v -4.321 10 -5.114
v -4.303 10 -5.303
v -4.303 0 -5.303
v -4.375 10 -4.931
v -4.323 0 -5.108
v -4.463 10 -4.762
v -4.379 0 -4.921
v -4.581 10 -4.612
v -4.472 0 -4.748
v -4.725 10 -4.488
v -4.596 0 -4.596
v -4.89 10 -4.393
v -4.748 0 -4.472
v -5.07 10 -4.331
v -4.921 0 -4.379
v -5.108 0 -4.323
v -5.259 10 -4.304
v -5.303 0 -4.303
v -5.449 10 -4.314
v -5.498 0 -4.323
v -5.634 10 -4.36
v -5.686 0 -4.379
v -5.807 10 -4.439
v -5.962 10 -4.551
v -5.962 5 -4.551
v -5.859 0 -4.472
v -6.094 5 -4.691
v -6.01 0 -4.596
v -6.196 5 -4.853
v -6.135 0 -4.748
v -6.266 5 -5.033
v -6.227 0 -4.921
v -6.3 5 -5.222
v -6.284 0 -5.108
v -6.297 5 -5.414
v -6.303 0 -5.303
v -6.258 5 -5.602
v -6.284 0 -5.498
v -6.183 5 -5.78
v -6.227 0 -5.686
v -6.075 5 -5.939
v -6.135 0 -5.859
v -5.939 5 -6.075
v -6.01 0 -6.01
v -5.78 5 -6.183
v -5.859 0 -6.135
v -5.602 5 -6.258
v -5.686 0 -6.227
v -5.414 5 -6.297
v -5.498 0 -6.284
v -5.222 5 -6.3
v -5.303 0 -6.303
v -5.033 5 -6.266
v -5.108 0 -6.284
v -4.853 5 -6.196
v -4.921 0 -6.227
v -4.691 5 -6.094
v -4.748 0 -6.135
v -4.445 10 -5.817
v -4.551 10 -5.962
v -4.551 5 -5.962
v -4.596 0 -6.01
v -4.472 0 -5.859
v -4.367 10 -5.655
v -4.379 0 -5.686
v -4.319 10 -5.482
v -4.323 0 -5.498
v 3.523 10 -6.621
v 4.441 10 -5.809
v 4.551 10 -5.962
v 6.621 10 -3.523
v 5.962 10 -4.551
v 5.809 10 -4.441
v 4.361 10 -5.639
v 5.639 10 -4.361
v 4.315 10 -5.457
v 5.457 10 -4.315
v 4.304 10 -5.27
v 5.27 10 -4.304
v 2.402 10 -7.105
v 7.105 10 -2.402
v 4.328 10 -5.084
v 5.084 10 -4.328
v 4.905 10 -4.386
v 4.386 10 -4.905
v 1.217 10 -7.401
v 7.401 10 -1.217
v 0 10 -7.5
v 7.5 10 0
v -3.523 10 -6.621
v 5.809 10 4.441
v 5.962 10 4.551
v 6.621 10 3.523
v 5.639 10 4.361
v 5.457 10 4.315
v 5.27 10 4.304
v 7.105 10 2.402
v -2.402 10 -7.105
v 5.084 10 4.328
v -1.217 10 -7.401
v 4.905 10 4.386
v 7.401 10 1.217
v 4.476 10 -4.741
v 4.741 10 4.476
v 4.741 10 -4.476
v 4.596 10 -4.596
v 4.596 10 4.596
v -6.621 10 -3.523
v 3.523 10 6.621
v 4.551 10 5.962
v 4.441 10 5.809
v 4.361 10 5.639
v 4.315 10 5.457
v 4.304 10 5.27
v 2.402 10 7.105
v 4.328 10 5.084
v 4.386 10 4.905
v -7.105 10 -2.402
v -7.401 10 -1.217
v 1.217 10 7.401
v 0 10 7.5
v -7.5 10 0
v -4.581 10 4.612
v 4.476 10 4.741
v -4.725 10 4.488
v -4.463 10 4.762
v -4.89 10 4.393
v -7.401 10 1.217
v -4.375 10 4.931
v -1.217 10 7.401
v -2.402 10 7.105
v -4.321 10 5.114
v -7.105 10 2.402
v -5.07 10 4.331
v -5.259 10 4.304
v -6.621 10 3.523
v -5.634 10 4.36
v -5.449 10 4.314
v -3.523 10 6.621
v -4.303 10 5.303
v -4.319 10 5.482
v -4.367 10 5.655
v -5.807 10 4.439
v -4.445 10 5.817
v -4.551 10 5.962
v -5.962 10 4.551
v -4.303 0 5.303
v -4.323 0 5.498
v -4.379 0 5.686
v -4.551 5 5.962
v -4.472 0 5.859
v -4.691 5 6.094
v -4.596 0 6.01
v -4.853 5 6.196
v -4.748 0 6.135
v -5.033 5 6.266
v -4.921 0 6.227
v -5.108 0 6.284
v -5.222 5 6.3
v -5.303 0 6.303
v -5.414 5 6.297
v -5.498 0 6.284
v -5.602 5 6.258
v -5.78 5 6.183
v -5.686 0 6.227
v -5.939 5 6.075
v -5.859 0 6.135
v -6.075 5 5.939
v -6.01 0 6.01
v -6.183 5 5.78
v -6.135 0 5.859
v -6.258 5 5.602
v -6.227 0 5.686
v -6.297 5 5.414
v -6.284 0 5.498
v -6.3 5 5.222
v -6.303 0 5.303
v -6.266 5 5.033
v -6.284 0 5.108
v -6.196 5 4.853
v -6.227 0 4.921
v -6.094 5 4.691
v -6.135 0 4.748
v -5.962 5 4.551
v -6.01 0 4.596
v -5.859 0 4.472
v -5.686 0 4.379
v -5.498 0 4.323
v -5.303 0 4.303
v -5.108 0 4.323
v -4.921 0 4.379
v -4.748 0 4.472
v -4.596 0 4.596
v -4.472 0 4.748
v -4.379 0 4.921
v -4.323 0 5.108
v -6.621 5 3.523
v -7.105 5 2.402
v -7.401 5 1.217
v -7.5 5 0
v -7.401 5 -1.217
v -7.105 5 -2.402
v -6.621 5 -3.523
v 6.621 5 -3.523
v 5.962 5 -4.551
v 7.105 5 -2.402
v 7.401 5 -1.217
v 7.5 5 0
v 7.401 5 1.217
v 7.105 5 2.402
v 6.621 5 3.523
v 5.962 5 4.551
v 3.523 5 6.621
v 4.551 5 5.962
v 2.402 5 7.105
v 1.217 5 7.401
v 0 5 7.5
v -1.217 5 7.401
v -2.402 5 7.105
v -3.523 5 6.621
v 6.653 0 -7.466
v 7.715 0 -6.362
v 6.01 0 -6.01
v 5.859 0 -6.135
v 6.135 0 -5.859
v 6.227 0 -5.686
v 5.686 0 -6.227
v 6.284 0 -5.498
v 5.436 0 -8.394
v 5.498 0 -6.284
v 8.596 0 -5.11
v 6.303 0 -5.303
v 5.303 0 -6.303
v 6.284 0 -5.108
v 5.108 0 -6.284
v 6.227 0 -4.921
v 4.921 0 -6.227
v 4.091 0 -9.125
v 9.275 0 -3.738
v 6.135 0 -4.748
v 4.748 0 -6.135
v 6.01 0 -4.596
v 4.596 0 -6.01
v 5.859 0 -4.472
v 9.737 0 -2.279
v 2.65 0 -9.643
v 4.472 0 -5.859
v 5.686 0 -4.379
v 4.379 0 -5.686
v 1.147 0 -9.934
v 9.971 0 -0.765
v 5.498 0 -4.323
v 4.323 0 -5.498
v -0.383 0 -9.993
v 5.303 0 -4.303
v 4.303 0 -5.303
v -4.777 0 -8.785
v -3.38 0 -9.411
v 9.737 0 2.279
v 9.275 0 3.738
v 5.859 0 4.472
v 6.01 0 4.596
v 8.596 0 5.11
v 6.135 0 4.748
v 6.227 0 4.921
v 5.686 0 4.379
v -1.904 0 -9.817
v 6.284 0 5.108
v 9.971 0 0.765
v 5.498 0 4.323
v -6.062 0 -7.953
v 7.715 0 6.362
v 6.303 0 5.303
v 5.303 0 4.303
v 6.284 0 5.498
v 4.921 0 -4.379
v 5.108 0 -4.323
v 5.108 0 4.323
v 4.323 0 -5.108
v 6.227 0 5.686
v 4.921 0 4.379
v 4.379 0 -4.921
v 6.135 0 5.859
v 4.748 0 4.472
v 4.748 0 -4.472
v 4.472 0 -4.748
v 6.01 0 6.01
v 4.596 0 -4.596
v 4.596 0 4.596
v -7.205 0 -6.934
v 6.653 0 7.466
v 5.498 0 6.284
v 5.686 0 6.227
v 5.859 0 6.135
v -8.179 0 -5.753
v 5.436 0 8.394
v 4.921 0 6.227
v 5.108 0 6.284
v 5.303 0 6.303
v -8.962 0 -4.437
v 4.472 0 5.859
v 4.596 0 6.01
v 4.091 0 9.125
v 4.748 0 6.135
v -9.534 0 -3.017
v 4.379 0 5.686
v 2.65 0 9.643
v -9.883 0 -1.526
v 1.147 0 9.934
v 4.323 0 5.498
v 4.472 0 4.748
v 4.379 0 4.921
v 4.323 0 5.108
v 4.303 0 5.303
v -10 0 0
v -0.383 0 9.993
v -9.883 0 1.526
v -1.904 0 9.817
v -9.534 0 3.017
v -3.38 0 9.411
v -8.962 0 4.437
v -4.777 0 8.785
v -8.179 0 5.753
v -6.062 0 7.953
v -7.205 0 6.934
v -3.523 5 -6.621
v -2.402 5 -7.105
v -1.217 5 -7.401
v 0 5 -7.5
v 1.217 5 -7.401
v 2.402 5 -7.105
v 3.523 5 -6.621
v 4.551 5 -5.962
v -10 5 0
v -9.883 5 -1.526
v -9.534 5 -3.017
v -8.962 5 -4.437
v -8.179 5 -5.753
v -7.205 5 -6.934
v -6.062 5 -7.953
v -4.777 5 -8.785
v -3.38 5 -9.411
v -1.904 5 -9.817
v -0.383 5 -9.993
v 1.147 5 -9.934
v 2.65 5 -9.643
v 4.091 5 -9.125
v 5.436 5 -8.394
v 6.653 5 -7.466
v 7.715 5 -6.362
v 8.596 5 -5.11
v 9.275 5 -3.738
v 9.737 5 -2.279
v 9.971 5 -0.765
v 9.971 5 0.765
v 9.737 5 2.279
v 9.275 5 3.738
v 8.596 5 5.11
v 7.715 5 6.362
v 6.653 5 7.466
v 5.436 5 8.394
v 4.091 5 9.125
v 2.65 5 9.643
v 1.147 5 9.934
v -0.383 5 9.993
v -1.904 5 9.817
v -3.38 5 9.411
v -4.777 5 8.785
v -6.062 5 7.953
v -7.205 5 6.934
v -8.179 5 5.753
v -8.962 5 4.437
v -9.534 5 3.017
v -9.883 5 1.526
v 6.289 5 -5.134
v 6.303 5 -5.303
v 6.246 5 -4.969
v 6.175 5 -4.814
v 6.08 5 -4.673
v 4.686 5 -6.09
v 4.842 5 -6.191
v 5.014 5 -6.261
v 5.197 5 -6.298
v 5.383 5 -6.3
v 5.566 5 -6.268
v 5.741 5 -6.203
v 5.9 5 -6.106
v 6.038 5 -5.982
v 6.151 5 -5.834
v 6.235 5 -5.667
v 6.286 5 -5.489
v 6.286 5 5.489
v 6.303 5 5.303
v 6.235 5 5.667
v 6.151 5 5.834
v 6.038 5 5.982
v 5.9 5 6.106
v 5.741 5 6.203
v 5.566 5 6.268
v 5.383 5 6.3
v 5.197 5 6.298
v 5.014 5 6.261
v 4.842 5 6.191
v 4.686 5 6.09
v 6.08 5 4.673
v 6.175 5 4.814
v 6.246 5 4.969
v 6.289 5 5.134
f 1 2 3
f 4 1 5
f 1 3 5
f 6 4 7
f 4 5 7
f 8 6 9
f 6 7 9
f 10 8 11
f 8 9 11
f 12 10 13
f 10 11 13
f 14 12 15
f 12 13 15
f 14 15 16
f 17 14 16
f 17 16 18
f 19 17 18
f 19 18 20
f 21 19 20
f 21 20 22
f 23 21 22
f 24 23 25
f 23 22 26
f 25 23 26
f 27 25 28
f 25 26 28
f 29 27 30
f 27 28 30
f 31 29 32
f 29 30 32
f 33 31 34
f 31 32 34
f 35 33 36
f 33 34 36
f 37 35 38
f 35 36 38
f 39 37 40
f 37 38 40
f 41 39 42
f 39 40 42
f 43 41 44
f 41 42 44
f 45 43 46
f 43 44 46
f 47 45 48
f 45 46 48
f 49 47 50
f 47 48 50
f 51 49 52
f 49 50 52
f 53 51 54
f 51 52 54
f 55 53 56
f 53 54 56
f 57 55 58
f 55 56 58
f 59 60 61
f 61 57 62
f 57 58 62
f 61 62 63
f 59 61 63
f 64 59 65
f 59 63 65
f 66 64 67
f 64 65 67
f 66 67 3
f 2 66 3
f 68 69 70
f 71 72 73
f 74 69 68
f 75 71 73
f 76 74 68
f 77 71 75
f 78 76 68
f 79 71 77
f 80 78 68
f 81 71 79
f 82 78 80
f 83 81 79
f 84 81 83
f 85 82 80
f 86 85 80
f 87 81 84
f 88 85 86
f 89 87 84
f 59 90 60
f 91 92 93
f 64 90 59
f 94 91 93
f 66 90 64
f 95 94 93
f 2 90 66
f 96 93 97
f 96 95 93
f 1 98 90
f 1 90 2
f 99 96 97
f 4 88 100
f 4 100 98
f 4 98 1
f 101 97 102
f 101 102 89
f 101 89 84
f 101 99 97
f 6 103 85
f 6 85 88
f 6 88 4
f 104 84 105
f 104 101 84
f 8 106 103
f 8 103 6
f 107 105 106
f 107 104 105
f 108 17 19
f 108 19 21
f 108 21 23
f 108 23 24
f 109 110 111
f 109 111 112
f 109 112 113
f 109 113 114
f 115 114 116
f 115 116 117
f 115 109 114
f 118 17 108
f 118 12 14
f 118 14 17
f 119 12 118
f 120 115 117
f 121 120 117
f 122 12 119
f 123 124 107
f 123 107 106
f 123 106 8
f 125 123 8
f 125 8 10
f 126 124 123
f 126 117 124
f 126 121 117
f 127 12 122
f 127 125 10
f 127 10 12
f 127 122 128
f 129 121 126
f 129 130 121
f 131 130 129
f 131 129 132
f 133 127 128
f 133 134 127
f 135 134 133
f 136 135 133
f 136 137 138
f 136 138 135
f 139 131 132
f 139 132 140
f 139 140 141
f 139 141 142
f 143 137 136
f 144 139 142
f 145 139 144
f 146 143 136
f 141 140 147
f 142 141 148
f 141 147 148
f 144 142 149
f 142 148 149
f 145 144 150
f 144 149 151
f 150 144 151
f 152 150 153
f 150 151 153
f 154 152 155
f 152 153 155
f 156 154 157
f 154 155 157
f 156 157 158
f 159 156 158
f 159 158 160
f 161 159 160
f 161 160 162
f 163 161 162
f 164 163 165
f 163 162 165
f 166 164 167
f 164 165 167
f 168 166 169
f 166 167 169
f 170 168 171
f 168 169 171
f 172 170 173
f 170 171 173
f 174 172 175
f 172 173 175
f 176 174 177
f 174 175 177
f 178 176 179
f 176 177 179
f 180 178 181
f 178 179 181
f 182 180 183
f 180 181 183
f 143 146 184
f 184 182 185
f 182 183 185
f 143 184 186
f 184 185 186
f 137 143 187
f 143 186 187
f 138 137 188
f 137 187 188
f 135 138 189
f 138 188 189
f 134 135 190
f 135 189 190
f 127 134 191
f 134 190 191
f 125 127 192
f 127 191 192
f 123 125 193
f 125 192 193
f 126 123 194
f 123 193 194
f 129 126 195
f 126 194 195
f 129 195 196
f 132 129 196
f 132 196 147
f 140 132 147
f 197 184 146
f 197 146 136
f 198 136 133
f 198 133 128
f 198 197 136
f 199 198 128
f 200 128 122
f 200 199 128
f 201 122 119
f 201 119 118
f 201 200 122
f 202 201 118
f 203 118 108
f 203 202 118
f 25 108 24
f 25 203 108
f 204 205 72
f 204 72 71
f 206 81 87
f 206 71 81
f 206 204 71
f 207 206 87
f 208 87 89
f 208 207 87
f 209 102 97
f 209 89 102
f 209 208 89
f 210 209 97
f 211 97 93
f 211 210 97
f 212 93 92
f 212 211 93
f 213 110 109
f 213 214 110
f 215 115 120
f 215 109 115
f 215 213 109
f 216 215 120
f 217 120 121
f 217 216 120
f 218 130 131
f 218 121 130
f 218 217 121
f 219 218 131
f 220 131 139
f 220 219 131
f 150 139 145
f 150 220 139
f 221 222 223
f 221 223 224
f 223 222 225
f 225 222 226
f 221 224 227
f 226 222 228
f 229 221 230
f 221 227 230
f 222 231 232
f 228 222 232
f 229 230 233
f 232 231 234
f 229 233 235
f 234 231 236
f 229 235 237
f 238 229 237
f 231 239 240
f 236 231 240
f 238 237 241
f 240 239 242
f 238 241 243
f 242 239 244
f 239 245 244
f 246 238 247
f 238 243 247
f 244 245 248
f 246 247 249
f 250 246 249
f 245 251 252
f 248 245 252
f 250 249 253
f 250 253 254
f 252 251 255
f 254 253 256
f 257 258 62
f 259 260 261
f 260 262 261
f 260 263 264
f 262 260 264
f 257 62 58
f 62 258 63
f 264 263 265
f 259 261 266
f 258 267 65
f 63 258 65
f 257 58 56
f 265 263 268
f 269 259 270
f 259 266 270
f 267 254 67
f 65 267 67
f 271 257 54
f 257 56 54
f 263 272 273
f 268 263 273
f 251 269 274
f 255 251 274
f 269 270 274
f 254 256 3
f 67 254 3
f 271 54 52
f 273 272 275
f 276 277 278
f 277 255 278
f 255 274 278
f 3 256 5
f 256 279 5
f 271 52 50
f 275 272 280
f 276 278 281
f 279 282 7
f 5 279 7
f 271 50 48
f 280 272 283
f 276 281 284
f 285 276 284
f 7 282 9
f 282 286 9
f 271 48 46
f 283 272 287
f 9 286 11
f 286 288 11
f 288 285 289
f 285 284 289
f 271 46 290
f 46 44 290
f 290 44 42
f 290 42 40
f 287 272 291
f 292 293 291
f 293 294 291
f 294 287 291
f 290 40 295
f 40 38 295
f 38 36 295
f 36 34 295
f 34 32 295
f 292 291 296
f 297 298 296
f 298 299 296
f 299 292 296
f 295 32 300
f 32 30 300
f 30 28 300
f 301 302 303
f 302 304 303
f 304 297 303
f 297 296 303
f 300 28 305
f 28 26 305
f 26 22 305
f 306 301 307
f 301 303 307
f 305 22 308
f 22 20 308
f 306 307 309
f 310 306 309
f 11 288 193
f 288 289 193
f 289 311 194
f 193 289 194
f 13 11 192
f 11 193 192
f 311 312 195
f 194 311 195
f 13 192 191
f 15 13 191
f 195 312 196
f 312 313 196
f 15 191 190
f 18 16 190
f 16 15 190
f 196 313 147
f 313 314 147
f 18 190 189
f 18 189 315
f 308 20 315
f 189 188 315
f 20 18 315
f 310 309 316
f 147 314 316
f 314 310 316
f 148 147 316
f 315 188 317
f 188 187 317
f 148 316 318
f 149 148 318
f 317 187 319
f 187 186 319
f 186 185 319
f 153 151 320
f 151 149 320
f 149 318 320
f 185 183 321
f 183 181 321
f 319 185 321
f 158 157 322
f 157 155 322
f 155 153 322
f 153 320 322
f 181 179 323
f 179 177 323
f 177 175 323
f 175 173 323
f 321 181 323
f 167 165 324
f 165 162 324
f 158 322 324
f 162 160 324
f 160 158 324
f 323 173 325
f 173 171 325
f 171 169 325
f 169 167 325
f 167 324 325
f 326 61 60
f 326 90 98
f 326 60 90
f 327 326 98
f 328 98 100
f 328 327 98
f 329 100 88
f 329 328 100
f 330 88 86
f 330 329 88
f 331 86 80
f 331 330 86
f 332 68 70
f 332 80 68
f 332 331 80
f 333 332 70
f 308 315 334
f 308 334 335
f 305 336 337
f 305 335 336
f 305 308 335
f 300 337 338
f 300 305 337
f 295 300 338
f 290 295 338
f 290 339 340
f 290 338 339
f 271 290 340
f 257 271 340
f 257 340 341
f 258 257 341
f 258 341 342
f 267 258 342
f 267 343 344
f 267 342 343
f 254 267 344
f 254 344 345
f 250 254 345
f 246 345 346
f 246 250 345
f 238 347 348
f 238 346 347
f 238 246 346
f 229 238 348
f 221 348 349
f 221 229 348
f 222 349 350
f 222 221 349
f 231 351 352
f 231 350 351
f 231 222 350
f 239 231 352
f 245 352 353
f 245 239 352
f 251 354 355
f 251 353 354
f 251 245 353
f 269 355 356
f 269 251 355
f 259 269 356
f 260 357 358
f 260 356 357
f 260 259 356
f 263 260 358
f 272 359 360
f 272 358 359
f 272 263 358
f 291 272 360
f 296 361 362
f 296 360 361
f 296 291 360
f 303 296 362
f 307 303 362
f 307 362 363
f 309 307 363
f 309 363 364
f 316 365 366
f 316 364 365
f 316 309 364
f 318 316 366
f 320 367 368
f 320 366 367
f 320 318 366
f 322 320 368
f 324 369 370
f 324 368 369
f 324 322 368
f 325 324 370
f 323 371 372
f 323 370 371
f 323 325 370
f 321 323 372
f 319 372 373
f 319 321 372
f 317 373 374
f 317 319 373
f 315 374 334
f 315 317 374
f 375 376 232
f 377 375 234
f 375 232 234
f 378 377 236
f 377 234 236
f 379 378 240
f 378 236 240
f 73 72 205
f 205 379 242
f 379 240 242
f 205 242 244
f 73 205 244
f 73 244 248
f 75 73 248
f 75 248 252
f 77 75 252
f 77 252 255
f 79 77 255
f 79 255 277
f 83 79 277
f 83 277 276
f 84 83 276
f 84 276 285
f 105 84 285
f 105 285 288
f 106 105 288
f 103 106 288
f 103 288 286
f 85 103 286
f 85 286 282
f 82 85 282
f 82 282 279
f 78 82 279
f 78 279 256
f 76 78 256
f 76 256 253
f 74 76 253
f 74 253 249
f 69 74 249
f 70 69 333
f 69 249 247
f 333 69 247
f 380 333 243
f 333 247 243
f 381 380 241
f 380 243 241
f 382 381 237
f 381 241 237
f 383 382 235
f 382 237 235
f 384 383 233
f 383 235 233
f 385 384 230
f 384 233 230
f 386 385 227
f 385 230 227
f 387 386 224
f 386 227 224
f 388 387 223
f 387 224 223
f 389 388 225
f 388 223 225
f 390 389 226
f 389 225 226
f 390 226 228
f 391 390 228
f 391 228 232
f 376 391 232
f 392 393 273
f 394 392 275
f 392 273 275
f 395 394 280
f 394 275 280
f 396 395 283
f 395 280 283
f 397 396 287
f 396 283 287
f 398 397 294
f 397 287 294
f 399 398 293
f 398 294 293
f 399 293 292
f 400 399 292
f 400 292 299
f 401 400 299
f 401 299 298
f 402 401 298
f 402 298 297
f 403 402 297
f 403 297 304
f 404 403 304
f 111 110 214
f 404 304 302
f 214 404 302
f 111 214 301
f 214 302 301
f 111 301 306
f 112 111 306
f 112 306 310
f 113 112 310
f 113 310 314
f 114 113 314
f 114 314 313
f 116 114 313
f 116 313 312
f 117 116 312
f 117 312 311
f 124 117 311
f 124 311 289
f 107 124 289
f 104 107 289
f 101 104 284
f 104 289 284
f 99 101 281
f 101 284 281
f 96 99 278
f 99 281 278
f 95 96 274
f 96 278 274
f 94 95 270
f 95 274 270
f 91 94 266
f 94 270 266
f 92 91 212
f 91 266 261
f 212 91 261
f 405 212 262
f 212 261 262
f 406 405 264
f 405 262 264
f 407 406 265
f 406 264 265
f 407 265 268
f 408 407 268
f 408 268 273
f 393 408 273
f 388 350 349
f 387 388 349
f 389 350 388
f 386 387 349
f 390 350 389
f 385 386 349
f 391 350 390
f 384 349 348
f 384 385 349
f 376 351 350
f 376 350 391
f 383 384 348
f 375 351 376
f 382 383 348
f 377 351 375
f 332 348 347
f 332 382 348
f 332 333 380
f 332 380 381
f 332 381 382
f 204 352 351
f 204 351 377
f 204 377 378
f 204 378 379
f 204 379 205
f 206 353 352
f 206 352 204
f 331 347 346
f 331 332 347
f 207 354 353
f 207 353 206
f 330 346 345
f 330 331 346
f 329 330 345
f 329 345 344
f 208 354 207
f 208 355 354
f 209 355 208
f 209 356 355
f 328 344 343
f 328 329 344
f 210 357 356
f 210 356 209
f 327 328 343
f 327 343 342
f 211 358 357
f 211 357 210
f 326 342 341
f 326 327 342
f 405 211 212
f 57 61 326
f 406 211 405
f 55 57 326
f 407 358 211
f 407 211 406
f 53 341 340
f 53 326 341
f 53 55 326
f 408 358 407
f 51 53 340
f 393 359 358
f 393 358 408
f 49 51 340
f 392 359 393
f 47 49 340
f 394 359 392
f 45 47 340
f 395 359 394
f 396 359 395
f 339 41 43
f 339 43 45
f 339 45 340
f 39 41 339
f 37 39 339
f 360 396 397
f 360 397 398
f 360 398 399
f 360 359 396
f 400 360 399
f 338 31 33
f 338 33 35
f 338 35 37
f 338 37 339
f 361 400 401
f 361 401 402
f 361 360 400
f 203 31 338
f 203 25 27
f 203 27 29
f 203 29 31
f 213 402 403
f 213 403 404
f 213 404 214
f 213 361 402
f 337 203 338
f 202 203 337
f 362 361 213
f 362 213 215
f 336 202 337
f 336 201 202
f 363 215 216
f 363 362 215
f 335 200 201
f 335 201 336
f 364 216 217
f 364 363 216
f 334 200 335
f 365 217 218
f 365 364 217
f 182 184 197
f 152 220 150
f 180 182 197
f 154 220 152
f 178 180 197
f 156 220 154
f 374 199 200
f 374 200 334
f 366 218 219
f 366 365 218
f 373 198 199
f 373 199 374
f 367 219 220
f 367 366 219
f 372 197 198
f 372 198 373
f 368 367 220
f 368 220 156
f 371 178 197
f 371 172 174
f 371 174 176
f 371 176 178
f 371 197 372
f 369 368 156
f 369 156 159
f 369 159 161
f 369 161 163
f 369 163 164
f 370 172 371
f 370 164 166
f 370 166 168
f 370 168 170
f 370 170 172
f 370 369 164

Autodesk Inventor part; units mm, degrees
ref_plane "YZ Plane" through (0, 0, 0) normal (1, 0, 0) x (0, 1, 0)
ref_plane "XZ Plane" through (0, 0, 0) normal (0, 1, 0) x (-1, 0, 0)
ref_plane "XY Plane" through (0, 0, 0) normal (0, 0, 1) x (1, 0, 0)
sketch "Sketch1" plane through (0, 0, 0) normal (0, 1, 0) x (-1, 0, 0)
  circle A0 centre (0, 0) radius 10
  circle A1 centre (0, 0) radius 7.5
  dimension "d0" = 20
  dimension "d1" = 15
extrude "Extrusion1" add sketch "Sketch1" along normal blind 10 contours A1
extrude "Extrusion2" add sketch "Sketch1" along normal blind 5
sketch "Sketch2" plane through (0, 0, 0) normal (0, -1, 0) x (1, 0, 0)
  circle A0 centre (0, 0) radius 10 projected
  line L0 (0, 0) -> (10, 0) construction
  line L1 (7.0711, -7.0711) -> (6.0104, -6.0104)
  circle A1 centre (0, 0) radius 7.5 projected
  circle A2 centre (5.3033, 5.3033) radius 1
  line L2 (0, 0) -> (2.7588, 0)
  line L3 (0, 0) -> (0, -2.4662)
  circle A3 centre (5.3033, -5.3033) radius 1
  circle A4 centre (-5.3033, 5.3033) radius 1
  circle A5 centre (-5.3033, -5.3033) radius 1
  dimension "d7" = 2
extrude "Extrusion3" cut sketch "Sketch2" against normal blind 10 contours A3 A1 | A3 A1 | A5 A1 | A1 A5 | A2 A1 | A1 A2 | A4 A1 | A1 A4
properties part number "magnete"
